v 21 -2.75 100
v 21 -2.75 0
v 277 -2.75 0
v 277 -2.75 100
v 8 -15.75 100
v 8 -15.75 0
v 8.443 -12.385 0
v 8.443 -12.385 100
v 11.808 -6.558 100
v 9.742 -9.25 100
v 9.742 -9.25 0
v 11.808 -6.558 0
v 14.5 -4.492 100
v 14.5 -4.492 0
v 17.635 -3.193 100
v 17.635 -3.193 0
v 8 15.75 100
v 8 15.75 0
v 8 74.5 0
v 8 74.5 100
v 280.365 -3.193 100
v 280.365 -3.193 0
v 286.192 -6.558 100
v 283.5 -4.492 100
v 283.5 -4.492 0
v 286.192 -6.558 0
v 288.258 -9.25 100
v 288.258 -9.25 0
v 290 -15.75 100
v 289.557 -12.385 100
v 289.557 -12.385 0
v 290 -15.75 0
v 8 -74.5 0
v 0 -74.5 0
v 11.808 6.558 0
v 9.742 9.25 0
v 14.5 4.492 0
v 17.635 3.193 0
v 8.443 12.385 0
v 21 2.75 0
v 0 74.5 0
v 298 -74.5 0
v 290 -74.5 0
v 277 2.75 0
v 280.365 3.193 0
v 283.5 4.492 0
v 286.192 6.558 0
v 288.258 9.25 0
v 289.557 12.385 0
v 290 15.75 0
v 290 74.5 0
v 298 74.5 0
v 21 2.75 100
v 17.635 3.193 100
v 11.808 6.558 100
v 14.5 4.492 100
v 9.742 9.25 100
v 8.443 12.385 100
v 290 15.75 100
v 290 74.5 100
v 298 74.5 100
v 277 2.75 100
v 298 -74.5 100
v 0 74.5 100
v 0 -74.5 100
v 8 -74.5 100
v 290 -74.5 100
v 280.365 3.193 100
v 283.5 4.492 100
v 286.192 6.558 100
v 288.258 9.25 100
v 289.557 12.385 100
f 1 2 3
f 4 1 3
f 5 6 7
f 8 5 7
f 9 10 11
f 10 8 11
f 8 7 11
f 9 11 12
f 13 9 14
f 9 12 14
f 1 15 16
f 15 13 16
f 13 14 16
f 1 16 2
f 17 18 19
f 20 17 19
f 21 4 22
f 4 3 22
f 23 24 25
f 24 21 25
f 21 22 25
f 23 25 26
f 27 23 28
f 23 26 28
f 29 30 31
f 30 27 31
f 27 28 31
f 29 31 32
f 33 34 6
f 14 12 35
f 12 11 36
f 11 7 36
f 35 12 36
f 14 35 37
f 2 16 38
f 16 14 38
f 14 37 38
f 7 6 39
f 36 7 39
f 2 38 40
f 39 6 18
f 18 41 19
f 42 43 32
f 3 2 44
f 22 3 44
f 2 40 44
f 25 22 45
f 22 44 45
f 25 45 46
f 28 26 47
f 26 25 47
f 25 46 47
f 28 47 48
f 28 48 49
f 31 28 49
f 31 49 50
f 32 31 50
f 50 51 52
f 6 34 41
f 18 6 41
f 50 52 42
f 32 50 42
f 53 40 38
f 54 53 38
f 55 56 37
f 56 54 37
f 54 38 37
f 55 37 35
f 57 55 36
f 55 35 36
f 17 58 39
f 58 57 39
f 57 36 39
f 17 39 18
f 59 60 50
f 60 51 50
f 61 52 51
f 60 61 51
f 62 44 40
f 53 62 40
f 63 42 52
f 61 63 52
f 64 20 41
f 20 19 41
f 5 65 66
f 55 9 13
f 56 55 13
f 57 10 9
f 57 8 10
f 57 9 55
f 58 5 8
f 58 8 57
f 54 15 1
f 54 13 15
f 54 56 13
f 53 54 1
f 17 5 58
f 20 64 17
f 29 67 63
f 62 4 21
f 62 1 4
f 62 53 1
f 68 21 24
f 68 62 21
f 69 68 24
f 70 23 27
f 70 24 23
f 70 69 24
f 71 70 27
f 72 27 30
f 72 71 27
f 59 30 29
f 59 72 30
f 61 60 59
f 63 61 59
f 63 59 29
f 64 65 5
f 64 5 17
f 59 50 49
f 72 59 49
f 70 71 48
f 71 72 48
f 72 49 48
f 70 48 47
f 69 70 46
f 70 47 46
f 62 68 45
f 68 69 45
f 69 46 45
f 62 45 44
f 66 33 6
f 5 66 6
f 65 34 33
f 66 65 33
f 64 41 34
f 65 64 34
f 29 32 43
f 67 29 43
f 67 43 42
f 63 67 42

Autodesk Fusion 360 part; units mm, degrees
sketch "スケッチ1" plane through (0, 0, 0) normal (0, 0, 1) x (1, 0, 0)
  line L0 (0, 74.5) -> (0, -74.5)
  line L1 (298, -74.5) -> (298, 74.5)
  line L2 (290, -15.75) -> (290, -74.5)
  line L3 (8, -74.5) -> (8, -15.75)
  line L4 (0, -74.5) -> (8, -74.5)
  line L5 (290, -74.5) -> (298, -74.5)
  line L6 (277, 2.75) -> (21, 2.75)
  line L7 (21, -2.75) -> (277, -2.75)
  line L8 (8, 15.75) -> (8, 74.5)
  arc A0 (8, 15.75) -> (21, 2.75) centre (21, 15.75) ccw
  arc A1 (21, -2.75) -> (8, -15.75) centre (21, -15.75) ccw
  line L9 (8, 74.5) -> (0, 74.5)
  line L10 (290, 74.5) -> (290, 15.75)
  arc A2 (277, 2.75) -> (290, 15.75) centre (277, 15.75) ccw
  arc A3 (290, -15.75) -> (277, -2.75) centre (277, -15.75) ccw
  line L11 (298, 74.5) -> (290, 74.5)
extrude "押し出し1" add sketch "スケッチ1" along normal blind 100
